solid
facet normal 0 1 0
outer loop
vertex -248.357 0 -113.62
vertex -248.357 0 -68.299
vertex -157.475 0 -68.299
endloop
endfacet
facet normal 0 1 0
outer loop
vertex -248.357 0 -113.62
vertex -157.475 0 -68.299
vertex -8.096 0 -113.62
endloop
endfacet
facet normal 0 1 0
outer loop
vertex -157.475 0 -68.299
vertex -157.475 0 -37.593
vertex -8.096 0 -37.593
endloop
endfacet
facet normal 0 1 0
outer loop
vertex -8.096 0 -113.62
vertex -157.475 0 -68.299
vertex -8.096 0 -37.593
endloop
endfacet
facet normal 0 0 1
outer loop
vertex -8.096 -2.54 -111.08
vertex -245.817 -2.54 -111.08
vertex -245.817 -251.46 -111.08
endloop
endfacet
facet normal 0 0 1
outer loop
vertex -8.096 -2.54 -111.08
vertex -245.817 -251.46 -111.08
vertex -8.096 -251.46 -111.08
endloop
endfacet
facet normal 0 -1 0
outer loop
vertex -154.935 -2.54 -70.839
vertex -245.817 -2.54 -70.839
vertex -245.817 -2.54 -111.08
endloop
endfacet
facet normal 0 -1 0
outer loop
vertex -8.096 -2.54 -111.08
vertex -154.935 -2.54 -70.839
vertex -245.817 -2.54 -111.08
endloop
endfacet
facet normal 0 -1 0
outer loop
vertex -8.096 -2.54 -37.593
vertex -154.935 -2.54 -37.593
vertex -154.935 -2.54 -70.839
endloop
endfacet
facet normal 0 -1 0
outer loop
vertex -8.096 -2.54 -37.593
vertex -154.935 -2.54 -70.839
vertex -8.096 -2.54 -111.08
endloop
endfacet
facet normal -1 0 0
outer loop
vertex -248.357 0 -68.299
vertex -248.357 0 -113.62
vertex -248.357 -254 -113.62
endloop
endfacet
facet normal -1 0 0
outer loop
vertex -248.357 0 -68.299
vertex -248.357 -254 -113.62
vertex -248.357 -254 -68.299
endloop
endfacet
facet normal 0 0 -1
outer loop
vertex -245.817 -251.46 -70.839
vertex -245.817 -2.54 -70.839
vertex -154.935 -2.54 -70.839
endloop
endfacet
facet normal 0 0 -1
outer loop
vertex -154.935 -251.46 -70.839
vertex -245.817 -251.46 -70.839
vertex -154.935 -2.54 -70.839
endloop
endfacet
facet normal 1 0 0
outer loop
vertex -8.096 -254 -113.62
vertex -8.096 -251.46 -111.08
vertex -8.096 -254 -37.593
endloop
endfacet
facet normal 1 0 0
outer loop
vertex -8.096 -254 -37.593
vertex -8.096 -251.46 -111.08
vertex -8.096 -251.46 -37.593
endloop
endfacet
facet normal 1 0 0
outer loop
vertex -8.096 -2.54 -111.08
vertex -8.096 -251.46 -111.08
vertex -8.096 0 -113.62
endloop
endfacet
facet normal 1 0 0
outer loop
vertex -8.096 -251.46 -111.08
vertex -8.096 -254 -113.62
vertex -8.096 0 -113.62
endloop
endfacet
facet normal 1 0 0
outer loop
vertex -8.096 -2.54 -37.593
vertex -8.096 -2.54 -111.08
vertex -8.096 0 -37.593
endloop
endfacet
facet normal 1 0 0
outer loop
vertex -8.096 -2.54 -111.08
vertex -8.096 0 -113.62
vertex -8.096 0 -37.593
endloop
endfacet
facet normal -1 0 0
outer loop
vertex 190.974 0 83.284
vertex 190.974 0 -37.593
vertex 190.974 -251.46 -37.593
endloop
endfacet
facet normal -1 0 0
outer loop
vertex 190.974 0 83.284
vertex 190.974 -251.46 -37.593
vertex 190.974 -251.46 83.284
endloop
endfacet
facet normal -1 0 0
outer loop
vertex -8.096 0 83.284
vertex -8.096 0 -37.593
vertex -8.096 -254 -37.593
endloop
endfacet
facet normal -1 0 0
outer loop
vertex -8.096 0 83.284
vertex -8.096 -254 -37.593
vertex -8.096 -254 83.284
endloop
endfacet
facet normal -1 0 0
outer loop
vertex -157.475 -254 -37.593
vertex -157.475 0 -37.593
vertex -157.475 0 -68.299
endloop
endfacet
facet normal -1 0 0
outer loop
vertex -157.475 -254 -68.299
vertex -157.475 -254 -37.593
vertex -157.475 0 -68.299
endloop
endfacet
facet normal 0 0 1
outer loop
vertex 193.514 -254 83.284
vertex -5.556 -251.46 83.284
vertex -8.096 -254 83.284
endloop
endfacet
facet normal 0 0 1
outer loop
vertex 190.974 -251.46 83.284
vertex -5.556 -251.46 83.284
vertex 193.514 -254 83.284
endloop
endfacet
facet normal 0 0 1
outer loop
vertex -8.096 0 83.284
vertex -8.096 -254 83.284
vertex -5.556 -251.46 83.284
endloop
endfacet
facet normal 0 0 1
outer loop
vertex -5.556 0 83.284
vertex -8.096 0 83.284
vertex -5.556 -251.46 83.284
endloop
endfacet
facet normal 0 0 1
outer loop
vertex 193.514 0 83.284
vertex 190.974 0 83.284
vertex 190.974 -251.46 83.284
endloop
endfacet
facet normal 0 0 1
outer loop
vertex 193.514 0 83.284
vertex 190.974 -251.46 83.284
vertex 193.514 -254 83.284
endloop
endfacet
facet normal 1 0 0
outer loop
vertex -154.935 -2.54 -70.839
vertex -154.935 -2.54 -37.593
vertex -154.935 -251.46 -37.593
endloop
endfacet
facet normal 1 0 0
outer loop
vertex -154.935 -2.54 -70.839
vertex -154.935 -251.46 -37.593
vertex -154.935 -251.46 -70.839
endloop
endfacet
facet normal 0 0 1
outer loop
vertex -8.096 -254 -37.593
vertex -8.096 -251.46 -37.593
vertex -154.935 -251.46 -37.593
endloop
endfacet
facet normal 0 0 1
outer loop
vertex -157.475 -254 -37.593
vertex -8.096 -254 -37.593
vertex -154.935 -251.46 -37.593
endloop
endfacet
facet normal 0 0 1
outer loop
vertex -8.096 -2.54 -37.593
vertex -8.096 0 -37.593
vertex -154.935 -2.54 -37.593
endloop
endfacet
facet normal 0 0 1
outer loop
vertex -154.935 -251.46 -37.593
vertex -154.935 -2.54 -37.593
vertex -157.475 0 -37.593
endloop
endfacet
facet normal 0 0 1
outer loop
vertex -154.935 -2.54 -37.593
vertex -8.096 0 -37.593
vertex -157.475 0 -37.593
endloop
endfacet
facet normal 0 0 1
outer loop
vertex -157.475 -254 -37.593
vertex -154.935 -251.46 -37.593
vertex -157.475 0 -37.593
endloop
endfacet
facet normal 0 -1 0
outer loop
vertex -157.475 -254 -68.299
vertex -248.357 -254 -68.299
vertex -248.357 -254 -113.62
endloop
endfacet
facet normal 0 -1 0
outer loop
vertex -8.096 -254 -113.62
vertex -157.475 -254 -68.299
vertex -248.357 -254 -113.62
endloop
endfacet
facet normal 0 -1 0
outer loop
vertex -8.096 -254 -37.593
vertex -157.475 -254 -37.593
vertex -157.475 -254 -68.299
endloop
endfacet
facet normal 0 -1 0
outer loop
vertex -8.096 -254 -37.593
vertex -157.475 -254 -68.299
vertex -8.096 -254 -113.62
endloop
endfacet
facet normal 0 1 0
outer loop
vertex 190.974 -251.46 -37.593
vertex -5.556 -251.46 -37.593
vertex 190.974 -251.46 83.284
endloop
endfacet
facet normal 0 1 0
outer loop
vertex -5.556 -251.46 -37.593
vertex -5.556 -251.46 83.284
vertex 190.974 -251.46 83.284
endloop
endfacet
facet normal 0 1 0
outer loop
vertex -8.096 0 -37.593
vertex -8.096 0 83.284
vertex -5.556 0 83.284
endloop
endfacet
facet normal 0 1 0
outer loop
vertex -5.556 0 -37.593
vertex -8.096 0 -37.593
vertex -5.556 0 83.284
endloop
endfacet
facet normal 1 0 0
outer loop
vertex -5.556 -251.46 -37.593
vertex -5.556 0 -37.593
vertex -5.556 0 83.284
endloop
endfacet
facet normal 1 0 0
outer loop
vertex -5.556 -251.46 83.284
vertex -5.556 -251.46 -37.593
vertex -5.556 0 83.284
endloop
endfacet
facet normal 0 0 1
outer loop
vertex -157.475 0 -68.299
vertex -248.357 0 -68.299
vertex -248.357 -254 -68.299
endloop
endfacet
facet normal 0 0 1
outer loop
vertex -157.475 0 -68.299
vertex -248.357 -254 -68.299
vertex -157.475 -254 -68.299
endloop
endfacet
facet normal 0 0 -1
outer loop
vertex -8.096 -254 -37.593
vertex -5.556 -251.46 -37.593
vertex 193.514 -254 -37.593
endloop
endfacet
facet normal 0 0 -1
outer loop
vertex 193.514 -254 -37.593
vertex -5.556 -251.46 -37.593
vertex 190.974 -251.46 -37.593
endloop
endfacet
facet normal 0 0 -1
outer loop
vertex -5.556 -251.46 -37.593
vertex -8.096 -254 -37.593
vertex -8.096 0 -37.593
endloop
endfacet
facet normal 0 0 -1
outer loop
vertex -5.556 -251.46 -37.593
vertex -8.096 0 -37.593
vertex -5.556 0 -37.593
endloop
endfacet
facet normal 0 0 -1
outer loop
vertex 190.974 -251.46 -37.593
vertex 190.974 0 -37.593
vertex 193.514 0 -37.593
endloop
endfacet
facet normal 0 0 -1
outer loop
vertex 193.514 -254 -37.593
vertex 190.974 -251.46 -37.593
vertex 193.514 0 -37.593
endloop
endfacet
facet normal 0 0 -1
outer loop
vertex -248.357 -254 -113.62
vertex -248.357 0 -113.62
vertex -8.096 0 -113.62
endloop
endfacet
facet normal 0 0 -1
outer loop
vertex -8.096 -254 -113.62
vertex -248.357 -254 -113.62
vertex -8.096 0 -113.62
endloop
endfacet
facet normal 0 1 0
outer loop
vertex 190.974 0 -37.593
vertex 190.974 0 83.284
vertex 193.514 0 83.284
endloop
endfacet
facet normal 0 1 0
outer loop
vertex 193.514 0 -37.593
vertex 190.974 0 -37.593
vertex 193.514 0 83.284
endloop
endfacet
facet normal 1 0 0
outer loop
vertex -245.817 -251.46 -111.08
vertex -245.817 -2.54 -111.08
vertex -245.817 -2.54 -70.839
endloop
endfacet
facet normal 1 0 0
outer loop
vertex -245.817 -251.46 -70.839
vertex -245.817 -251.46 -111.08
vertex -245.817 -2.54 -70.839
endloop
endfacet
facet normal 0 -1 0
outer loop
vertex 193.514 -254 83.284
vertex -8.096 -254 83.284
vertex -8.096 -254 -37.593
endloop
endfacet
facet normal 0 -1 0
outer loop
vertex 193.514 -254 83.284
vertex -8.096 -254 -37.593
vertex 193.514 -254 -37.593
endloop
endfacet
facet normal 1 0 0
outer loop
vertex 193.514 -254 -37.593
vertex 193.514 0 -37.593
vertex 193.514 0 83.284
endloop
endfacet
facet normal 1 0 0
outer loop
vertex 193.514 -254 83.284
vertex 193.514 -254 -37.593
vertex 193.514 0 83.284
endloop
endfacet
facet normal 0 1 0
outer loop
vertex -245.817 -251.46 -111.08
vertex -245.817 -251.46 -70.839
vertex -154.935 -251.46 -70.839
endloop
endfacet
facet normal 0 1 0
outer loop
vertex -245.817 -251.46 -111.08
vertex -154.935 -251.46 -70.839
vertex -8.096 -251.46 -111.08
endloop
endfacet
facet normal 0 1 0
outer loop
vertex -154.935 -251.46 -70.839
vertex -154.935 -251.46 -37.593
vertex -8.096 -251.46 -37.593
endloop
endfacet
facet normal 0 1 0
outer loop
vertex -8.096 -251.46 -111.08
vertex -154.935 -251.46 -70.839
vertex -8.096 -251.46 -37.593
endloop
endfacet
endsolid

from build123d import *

# Parameters (mm, degrees)
F0_W     = 201.6101973131
F0_H     = 120.8766028285
F1_DEPTH = 254
F0_W_2   = 90.8812731504
F0_H_2   = 45.3207865357
F2_T     = -2.54
F2_2_T   = -2.54


with BuildPart() as f1:
    # F0 (on Front) → F1 (new body)
    with BuildSketch(Plane.XZ):
        with Locations((92.709352728, 22.8455923498)):
            Rectangle(F0_W, F0_H)
    extrude(amount=F1_DEPTH)

    # F2
    f2_openings = [f1.faces().sort_by_distance(p)[0] for p in [
        (92.709353, -127, 83.283894),
        (92.709353, -127, -37.592709),
        (92.709353, 0, 22.845592),
    ]]
    offset(amount=F2_T, openings=f2_openings)


with BuildPart() as f1b:
    # F0 (on Front) → F1, piece 2 (new body)
    with BuildSketch(Plane.XZ):
        with Locations((-202.9159590602, -90.9597761929)):
            Rectangle(F0_W_2, F0_H_2)
        Polygon((-157.475322485, -37.5927090645), (-157.475322485, -68.299382925), (-157.475322485, -113.6201694608), (-8.0957459286, -113.6201694608), (-8.0957459286, -37.5927090645), align=None)
    extrude(amount=F1_DEPTH)

    # F2#2
    f2_2_openings = [f1b.faces().sort_by_distance(p)[0] for p in [
        (-82.785534, -127, -37.592709),
        (-8.095746, -127, -75.606439),
    ]]
    offset(amount=F2_2_T, openings=f2_2_openings, kind=Kind.INTERSECTION)


solid = Compound([f1.part, f1b.part])
